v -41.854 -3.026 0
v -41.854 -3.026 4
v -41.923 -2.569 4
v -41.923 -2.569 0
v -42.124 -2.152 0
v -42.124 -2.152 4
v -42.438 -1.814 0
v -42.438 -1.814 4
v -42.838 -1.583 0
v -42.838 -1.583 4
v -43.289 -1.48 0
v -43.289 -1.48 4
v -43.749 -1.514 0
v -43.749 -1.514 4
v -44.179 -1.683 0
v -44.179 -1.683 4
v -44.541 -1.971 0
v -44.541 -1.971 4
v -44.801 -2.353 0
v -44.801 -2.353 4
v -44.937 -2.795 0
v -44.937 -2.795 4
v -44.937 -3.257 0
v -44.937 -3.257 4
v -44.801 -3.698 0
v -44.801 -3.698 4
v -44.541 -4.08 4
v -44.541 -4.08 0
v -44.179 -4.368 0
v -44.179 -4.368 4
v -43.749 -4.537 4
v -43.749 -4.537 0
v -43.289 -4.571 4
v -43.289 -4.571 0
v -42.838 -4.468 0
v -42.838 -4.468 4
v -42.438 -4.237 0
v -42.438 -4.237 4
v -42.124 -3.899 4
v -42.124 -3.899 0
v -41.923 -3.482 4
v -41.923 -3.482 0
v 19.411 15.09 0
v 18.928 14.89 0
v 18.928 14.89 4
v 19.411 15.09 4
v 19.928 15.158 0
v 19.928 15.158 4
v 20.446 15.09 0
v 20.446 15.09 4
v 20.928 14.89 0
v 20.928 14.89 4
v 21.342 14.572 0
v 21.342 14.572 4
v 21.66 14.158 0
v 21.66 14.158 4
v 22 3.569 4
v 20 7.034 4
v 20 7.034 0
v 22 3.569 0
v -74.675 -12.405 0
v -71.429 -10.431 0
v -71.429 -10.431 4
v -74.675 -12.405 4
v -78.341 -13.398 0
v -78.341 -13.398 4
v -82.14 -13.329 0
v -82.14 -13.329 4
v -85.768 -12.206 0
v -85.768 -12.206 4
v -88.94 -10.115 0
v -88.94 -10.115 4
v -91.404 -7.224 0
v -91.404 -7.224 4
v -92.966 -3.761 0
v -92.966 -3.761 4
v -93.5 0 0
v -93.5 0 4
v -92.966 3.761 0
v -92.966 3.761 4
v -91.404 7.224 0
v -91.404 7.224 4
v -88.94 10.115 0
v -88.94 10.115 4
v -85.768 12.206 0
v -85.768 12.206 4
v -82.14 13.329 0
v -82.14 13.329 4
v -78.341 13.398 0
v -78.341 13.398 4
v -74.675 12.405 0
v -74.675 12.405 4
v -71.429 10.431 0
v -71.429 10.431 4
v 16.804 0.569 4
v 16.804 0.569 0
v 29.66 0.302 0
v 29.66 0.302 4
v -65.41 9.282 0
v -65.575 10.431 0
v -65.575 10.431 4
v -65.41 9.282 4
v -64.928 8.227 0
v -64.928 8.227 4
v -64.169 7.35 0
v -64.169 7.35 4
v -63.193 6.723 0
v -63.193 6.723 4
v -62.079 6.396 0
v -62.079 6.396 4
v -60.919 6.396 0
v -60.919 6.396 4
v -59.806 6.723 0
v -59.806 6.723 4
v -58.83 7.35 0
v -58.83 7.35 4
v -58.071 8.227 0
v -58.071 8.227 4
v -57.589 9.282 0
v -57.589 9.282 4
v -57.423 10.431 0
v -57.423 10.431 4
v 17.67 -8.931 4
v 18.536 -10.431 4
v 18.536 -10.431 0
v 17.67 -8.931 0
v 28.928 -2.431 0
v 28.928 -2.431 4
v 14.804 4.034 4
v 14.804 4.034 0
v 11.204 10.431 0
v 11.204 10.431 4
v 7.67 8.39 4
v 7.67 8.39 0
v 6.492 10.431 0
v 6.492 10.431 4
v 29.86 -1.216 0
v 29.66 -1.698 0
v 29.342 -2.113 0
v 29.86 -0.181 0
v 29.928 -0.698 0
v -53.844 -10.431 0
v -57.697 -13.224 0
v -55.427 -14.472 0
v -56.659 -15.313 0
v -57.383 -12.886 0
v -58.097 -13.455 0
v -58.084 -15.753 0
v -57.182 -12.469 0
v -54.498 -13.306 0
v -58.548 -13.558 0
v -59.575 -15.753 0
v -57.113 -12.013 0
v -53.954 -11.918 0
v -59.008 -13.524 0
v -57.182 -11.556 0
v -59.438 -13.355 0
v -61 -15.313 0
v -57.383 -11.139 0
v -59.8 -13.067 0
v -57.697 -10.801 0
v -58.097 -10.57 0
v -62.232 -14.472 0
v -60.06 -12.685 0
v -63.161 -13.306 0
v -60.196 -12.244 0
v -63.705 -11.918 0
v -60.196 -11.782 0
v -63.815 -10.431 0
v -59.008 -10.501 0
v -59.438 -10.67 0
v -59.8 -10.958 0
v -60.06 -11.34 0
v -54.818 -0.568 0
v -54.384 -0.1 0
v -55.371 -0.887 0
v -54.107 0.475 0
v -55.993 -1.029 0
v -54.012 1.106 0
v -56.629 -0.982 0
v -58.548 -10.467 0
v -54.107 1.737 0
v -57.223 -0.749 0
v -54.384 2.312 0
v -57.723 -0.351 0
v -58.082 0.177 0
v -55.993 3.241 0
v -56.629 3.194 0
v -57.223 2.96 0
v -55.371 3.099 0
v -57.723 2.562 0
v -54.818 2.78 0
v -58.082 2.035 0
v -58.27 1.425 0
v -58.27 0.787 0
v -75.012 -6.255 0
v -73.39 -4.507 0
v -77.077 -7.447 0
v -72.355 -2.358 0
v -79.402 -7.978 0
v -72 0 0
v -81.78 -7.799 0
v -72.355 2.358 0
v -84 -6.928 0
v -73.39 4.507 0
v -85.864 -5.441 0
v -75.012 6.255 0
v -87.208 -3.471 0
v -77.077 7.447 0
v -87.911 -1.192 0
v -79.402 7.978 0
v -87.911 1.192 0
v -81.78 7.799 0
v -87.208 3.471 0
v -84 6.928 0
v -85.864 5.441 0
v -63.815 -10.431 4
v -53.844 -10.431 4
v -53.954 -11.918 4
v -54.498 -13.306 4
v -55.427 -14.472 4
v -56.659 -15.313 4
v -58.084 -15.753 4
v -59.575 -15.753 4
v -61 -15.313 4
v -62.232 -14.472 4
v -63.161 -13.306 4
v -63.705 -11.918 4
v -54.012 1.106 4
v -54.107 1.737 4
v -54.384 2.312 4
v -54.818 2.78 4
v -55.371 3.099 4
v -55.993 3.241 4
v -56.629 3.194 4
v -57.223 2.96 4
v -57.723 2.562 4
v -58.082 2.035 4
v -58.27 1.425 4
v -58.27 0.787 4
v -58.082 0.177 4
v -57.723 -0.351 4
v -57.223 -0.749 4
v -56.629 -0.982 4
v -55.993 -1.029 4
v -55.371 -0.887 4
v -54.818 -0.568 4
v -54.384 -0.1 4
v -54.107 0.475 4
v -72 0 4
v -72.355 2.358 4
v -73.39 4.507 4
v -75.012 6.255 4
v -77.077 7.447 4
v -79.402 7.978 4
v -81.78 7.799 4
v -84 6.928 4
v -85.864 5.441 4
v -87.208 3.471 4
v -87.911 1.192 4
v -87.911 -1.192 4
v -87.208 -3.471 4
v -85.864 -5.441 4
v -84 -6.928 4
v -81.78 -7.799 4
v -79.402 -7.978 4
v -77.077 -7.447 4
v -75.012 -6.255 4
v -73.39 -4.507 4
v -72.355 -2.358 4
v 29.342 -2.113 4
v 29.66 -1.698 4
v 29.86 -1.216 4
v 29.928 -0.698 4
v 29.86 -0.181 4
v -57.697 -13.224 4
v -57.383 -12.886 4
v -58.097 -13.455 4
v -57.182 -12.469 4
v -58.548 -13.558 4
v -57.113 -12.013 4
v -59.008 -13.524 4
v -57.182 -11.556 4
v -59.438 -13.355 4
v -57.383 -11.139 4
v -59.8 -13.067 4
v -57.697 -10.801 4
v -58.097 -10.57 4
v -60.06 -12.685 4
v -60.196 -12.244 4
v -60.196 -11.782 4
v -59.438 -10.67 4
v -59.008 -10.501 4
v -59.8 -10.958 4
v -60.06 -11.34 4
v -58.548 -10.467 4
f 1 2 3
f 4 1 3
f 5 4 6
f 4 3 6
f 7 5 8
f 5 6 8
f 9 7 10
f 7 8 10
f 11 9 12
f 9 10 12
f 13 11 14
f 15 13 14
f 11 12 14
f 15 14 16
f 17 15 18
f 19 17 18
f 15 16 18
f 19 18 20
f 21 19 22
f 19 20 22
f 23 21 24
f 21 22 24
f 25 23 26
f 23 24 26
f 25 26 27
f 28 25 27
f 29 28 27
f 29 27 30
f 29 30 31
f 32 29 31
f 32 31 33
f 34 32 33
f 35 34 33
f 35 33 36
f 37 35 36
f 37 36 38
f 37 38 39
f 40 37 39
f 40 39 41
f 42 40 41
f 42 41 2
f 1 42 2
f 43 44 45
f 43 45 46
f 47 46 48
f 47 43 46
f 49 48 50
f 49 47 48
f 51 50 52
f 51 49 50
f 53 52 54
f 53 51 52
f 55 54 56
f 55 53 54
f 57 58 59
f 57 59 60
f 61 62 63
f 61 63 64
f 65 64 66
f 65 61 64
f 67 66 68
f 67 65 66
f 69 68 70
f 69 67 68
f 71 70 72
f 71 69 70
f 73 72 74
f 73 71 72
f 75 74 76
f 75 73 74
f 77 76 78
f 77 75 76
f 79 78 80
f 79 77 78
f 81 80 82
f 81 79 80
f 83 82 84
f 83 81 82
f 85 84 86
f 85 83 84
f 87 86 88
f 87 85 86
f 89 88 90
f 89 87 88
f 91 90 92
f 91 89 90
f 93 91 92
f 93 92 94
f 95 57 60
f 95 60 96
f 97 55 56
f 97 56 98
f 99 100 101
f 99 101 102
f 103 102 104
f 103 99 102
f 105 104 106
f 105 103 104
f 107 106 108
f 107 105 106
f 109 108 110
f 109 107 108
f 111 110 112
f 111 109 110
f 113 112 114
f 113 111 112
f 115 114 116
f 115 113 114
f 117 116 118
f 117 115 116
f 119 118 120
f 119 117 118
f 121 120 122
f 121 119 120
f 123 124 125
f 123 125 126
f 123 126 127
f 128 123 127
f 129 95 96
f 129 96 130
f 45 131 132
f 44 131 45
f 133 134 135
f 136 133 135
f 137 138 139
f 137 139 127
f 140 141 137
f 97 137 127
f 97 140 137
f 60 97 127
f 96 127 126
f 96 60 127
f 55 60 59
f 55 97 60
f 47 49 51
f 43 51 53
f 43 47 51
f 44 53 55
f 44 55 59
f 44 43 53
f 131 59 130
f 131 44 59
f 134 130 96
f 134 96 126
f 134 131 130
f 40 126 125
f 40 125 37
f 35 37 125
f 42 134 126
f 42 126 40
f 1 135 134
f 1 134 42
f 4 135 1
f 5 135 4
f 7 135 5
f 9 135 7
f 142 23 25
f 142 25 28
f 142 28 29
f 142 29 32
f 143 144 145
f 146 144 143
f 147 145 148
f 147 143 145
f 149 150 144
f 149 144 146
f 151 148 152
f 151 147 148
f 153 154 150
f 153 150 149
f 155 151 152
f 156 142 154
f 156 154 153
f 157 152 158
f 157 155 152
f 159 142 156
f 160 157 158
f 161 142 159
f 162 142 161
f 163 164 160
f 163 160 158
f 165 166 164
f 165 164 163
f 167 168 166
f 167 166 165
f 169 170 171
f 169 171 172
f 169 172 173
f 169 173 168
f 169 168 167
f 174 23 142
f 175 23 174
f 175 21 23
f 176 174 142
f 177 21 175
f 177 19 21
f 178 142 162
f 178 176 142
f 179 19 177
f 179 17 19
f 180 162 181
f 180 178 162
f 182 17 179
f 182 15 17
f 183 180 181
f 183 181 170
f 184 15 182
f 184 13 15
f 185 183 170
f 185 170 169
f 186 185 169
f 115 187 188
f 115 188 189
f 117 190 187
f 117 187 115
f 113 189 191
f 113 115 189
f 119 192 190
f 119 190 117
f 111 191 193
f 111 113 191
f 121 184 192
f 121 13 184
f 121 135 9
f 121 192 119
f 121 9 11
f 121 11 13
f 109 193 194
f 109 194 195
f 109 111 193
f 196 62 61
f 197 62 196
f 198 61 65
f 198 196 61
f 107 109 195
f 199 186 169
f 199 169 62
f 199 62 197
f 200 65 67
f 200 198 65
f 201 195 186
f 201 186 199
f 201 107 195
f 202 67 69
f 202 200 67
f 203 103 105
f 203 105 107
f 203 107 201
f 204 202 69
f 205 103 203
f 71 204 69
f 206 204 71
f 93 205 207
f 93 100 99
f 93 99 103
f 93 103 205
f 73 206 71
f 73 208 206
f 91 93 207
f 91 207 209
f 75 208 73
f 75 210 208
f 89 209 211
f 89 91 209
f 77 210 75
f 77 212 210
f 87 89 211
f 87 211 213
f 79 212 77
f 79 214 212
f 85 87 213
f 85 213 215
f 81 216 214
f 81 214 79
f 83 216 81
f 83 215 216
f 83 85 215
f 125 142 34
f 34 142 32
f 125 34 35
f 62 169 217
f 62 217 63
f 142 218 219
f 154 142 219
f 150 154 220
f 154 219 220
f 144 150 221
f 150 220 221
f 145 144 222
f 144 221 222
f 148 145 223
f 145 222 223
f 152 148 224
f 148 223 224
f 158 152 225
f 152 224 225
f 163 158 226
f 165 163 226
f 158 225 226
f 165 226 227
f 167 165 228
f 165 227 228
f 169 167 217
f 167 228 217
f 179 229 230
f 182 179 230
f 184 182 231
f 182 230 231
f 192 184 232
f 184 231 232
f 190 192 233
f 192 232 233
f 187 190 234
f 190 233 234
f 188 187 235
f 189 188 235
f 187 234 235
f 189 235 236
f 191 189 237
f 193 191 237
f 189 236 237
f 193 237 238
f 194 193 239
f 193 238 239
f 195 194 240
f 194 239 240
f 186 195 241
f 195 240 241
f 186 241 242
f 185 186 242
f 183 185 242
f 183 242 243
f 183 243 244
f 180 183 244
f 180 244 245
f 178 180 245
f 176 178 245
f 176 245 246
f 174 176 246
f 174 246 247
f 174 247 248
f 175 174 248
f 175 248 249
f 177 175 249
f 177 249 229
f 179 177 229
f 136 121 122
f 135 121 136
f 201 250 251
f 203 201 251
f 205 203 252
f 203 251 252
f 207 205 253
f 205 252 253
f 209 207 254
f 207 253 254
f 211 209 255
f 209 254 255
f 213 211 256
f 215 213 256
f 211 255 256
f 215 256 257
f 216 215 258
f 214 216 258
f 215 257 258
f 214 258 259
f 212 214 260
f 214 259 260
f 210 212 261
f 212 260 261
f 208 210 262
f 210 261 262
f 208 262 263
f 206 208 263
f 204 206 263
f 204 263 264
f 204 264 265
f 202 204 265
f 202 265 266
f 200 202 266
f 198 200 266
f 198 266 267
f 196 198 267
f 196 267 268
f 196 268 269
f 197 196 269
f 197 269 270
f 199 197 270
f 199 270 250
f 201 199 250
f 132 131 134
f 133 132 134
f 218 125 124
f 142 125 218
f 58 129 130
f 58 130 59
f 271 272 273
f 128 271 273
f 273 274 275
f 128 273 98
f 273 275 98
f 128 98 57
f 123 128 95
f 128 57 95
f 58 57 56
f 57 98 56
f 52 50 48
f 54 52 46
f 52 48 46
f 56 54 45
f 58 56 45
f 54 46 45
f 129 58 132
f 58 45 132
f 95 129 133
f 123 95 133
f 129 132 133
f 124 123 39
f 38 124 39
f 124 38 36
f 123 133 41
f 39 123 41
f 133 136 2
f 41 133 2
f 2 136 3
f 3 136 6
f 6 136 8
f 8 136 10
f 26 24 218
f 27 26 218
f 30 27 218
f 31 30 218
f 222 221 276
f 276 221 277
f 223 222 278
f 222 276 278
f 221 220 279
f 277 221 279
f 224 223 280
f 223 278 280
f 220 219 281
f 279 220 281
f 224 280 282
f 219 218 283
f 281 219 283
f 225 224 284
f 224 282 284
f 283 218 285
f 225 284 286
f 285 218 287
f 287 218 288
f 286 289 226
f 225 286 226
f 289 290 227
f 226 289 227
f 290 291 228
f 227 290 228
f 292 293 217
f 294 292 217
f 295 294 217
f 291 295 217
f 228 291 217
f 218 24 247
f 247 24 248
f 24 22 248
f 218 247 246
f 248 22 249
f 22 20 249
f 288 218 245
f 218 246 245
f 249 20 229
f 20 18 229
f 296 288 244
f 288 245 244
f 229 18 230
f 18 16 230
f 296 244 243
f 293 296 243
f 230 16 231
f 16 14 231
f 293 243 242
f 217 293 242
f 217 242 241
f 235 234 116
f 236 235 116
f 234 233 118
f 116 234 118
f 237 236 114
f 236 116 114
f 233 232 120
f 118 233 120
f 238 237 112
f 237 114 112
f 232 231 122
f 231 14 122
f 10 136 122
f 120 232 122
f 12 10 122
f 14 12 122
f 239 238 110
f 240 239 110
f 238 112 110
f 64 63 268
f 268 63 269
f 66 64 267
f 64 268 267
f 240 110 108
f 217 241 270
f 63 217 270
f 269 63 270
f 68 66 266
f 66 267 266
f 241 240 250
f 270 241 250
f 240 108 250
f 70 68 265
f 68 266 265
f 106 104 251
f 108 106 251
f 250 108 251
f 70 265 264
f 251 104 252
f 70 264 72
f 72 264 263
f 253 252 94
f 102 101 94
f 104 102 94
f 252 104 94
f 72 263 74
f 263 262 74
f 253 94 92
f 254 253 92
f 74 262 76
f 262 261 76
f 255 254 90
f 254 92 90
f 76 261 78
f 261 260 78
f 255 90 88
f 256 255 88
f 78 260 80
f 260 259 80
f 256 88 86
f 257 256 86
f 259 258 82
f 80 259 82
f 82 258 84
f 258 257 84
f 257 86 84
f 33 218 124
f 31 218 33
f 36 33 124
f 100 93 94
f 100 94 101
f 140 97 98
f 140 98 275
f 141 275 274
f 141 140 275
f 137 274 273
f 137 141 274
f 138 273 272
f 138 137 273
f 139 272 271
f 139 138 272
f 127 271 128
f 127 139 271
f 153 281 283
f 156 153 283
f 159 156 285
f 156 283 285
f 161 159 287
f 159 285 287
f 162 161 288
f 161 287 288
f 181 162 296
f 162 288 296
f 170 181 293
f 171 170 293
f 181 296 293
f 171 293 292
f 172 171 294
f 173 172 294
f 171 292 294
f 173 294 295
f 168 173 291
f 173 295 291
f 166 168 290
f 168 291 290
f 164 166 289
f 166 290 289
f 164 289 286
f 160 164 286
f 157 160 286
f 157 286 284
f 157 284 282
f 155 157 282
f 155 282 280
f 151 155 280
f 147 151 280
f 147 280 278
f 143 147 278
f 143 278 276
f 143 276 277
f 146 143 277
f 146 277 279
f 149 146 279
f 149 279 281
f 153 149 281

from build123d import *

# Parameters (mm, degrees)
AUFSATZ_LINEAR_AUSTRAGEN1_DEPTH = 4
SCHNITT_LINEAR_AUSTRAGEN1_REACH = 6
SKIZZE2_R                       = 8
SKIZZE2_R_2                     = 2.141321697
SCHNITT_LINEAR_START            = -4
SCHNITT_LINEAR_AUSTRAGEN2_DEPTH = 4
AUFSATZ_LINEAR_AUSTRAGEN3_DEPTH = 4
AUFSATZ_LINEAR_AUSTRAGEN4_DEPTH = 4
SCHNITT_LINEAR_AUSTRAGEN3_REACH = 6
SKIZZE6_R                       = 1.55


with BuildPart() as part:
    # Skizze1 → Aufsatz-Linear austragen1 (new body)
    with BuildSketch(Plane.XY):
        with BuildLine():
            Line((28.570550732, -10.430515814), (-71.429449268, -10.430515814))
            ThreePointArc((-71.429449268, -10.430515814), (-93.5, 0), (-71.429449268, 10.430515814))
            Line((-71.429449268, 10.430515814), (-65.575289804, 10.430515814))
            ThreePointArc((-65.575289804, 10.430515814), (-61.49939442, 6.35462043), (-57.423499036, 10.430515814))
            Line((-57.423499036, 10.430515814), (28.570550732, 10.430515814))
            ThreePointArc((28.570550732, 10.430515814), (39.001066546, 0), (28.570550732, -10.430515814))
        make_face()
    extrude(amount=AUFSATZ_LINEAR_AUSTRAGEN1_DEPTH)

    # Skizze2 → Schnitt-Linear austragen1 (cut, up to next)
    with BuildSketch(Plane.XY.offset(4), mode=Mode.PRIVATE) as schnitt_linear_austragen1_sk1:
        with Locations((-80, 0)):
            Circle(SKIZZE2_R)
    schnitt_linear_austragen1_tool1 = extrude(schnitt_linear_austragen1_sk1.sketch, amount=-SCHNITT_LINEAR_AUSTRAGEN1_REACH, mode=Mode.PRIVATE) & part.part
    add(schnitt_linear_austragen1_tool1.solids().sort_by_distance((-80, 0, 4))[0], mode=Mode.SUBTRACT)
    # Skizze2 → Schnitt-Linear austragen1 (cut, up to next)
    with BuildSketch(Plane.XY.offset(4), mode=Mode.PRIVATE) as schnitt_linear_austragen1_sk2:
        with Locations((-56.152824314, 1.105869461)):
            Circle(SKIZZE2_R_2)
    schnitt_linear_austragen1_tool2 = extrude(schnitt_linear_austragen1_sk2.sketch, amount=-SCHNITT_LINEAR_AUSTRAGEN1_REACH, mode=Mode.PRIVATE) & part.part
    add(schnitt_linear_austragen1_tool2.solids().sort_by_distance((-56.152824, 1.105869, 4))[0], mode=Mode.SUBTRACT)
    # Skizze2 → Schnitt-Linear austragen1 (cut, up to next)
    with BuildSketch(Plane.XY.offset(4), mode=Mode.PRIVATE) as schnitt_linear_austragen1_sk3:
        Polygon((14.803847577, 4.033585801), (20, 7.033585801), (22, 3.569484186), (16.803847577, 0.569484186), align=None)
    schnitt_linear_austragen1_tool3 = extrude(schnitt_linear_austragen1_sk3.sketch, amount=-SCHNITT_LINEAR_AUSTRAGEN1_REACH, mode=Mode.PRIVATE) & part.part
    add(schnitt_linear_austragen1_tool3.solids().sort_by_distance((18.401924, 3.801535, 4))[0], mode=Mode.SUBTRACT)

    # Skizze3 → Schnitt-Linear austragen2 (cut)
    with BuildSketch(Plane.XY.offset(4).offset(SCHNITT_LINEAR_START)):
        Polygon((34.526391185, 28.400642866), (53.593329276, -4.624262653), (24.786074739, -21.256138815), (17.669872981, -8.930515814), (28.92820323, -2.430515814), (18.92820323, 14.889992262), (7.669872981, 8.389992262), (5.719136647, 11.768766704), align=None)
    extrude(amount=SCHNITT_LINEAR_AUSTRAGEN2_DEPTH, mode=Mode.SUBTRACT)

    # Skizze4 → Aufsatz-Linear austragen3 (add)
    with BuildSketch(Plane.XY):
        with BuildLine():
            Line((11.204163448, 10.430515814), (18.92820323, 14.889992262))
            ThreePointArc((18.92820323, 14.889992262), (20.44584132, 15.089793107), (21.660254038, 14.157941454))
            Line((21.660254038, 14.157941454), (29.660254038, 0.301534994))
            ThreePointArc((29.660254038, 0.301534994), (29.860054883, -1.216103097), (28.92820323, -2.430515814))
            Line((28.92820323, -2.430515814), (21.502883158, 10.430515814))
            Line((21.502883158, 10.430515814), (11.204163448, 10.430515814))
        make_face()
    extrude(amount=AUFSATZ_LINEAR_AUSTRAGEN3_DEPTH)

    # Skizze5 → Aufsatz-Linear austragen4 (add)
    with BuildSketch(Plane.XY.offset(4)):
        with BuildLine():
            Line((-63.815140393, -10.430515814), (-53.843758142, -10.430515814))
            ThreePointArc((-53.843758142, -10.430515814), (-58.829449268, -15.808515814), (-63.815140393, -10.430515814))
        make_face()
    extrude(amount=-AUFSATZ_LINEAR_AUSTRAGEN4_DEPTH)

    # Skizze6 → Schnitt-Linear austragen3 (cut, up to next)
    with BuildSketch(Plane.XY.offset(4), mode=Mode.PRIVATE) as schnitt_linear_austragen3_sk1:
        with Locations((-58.663449268, -12.012515814)):
            Circle(SKIZZE6_R)
    schnitt_linear_austragen3_tool1 = extrude(schnitt_linear_austragen3_sk1.sketch, amount=-SCHNITT_LINEAR_AUSTRAGEN3_REACH, mode=Mode.PRIVATE) & part.part
    add(schnitt_linear_austragen3_tool1.solids().sort_by_distance((-58.663449, -12.012516, 4))[0], mode=Mode.SUBTRACT)
    # Skizze6 → Schnitt-Linear austragen3 (cut, up to next)
    with BuildSketch(Plane.XY.offset(4), mode=Mode.PRIVATE) as schnitt_linear_austragen3_sk2:
        with Locations((-43.404449268, -3.025515814)):
            Circle(SKIZZE6_R)
    schnitt_linear_austragen3_tool2 = extrude(schnitt_linear_austragen3_sk2.sketch, amount=-SCHNITT_LINEAR_AUSTRAGEN3_REACH, mode=Mode.PRIVATE) & part.part
    add(schnitt_linear_austragen3_tool2.solids().sort_by_distance((-43.404449, -3.025516, 4))[0], mode=Mode.SUBTRACT)


solid = part.part
